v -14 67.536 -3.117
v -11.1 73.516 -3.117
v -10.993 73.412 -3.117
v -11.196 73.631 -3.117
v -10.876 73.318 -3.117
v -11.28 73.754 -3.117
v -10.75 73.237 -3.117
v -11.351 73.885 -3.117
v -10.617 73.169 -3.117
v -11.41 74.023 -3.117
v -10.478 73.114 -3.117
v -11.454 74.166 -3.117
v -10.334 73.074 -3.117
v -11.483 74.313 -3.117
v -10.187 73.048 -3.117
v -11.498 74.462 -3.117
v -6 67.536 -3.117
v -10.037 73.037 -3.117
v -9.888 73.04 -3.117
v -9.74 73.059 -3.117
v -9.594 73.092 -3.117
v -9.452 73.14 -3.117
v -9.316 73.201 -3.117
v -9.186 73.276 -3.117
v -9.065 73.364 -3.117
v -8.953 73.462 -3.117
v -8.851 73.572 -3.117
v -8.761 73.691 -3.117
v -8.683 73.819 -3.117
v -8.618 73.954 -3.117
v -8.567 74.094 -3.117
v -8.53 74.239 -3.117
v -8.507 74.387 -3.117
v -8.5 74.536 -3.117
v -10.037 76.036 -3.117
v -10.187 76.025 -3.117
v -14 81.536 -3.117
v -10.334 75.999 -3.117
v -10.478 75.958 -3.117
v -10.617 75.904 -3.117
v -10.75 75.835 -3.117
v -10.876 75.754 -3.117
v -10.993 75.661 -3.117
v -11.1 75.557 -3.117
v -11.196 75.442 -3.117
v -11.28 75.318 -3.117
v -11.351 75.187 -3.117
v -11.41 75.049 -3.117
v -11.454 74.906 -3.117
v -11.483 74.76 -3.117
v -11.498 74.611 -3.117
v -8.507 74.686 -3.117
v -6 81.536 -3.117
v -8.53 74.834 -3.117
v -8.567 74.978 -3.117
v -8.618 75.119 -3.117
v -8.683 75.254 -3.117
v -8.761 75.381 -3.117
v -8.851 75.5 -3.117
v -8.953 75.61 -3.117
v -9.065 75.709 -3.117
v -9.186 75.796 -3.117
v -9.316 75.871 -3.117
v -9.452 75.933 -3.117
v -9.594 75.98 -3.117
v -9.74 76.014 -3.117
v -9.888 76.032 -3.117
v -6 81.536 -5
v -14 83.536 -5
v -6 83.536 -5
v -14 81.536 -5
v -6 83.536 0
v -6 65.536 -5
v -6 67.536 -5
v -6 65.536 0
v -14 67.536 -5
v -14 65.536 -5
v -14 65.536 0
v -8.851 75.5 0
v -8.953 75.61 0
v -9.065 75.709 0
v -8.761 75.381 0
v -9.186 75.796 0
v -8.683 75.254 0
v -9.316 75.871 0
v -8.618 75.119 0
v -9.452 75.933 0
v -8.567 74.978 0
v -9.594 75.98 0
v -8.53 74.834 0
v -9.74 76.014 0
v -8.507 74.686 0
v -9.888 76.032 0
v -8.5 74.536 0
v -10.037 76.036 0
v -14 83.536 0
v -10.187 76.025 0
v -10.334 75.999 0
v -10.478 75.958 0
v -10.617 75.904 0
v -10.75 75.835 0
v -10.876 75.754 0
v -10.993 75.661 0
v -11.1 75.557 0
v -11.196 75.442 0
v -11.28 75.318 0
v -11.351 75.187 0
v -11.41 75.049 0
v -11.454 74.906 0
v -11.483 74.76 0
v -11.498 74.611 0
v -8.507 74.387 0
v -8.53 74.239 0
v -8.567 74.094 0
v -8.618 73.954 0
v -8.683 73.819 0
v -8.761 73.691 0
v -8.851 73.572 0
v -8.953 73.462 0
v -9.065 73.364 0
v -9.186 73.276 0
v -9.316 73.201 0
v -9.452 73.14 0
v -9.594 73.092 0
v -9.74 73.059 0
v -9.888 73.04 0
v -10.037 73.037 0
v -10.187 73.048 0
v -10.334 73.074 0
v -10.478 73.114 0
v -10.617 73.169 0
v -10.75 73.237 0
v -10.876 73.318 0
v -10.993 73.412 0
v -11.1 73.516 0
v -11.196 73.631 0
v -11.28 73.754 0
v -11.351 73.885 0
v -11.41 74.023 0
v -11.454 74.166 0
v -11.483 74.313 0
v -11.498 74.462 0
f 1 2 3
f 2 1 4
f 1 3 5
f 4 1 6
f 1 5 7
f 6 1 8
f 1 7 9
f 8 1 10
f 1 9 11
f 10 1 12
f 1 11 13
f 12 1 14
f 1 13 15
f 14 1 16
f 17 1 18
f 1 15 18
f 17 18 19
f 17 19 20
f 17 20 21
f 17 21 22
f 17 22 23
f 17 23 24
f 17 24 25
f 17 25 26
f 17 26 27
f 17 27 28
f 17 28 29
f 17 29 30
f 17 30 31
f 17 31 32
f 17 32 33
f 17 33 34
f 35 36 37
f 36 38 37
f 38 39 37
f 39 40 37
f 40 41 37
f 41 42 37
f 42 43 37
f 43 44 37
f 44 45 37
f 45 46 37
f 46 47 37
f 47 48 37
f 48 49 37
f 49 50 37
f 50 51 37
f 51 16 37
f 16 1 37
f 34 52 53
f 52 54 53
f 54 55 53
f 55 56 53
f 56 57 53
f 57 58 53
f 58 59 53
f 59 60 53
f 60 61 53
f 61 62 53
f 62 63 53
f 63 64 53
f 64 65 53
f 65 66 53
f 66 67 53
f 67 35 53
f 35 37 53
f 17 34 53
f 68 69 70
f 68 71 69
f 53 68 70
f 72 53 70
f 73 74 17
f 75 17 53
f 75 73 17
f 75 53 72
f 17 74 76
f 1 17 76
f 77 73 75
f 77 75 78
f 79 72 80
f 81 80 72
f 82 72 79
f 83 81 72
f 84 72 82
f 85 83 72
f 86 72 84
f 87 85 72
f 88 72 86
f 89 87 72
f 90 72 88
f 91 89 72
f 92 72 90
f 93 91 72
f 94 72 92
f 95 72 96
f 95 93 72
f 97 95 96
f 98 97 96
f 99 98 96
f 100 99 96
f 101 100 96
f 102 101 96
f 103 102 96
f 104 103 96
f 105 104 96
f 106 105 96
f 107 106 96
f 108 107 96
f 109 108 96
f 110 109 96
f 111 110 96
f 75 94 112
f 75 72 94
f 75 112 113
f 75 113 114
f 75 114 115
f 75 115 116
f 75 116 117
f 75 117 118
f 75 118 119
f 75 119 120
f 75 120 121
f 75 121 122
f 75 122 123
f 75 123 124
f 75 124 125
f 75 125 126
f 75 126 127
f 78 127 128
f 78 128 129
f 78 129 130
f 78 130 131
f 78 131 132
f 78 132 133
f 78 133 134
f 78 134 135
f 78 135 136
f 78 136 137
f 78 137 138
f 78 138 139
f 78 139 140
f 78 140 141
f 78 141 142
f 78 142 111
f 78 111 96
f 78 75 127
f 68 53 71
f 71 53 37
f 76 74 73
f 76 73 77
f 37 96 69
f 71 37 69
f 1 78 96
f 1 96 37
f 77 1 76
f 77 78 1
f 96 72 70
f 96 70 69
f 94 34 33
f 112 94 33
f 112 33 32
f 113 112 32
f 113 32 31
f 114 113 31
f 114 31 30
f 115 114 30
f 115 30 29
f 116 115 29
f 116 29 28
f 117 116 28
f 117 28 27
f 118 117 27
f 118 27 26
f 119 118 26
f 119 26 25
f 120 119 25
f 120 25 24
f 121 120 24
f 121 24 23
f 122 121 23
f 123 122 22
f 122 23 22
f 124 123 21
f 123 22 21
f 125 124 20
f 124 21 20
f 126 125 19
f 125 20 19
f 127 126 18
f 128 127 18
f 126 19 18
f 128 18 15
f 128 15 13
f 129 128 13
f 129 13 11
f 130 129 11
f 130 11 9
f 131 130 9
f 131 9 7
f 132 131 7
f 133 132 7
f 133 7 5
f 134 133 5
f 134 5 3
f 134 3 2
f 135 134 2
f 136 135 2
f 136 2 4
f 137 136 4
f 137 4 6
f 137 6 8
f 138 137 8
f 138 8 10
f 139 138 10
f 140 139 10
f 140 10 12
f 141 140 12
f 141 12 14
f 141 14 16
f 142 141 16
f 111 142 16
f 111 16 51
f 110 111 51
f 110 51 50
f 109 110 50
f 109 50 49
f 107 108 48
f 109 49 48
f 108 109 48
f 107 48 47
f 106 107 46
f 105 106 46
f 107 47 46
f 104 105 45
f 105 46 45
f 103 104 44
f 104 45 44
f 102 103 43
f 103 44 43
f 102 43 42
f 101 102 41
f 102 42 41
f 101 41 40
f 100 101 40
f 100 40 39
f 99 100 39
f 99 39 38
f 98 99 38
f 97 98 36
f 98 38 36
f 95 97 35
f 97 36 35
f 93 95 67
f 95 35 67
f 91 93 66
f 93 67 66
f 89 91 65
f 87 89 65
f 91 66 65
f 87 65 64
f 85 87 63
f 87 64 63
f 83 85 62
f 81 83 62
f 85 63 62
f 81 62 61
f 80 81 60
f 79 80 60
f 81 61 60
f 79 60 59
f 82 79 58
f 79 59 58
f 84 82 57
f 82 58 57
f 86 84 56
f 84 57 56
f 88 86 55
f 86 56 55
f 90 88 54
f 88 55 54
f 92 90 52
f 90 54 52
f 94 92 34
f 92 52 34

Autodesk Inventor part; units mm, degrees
ref_plane "YZ Plane" through (0, 0, 0) normal (1, 0, 0) x (0, 1, 0)
ref_plane "XZ Plane" through (0, 0, 0) normal (0, 1, 0) x (-1, 0, 0)
ref_plane "XY Plane" through (0, 0, 0) normal (0, 0, 1) x (1, 0, 0)
ref_plane "Work Plane1" through (0, 69.5363, 0) normal (0, 0, 1) x (1, 0, 0)
sketch "Sketch1" plane through (0, 69.5363, 0) normal (0, 0, 1) x (1, 0, 0)
  line L0 (9.2773, 16.5681) -> (-0.7227, 16.5681) projected
  line L1 (0, -69.5363) -> (0, -2) projected
  line L2 (-20, 0) -> (-20, -2) projected
  line L3 (0, -2) -> (-20, -2)
  line L4 (-20, -2) -> (-20, 12)
  line L5 (-20, 12) -> (0, 12)
  line L6 (0, 12) -> (0, -2)
  dimension "d17" = 14
  dimension "d18" = 20
extrude "Extrusion1" add sketch "Sketch1" along normal blind -3.1173
sketch "Sketch2" plane through (0, 69.5363, -3.1173) normal (0, 0, -1) x (1, 0, 0)
  line L0 (0, 2) -> (-20, -12)
  line L1 (-20, 2) -> (0, -12)
  circle A0 centre (-10, -5) radius 1.5
  point P0 (0, 69.5363)
  point P1 (-10, 4)
  dimension "d22" = 3
extrude "Extrusion2" cut sketch "Sketch2" against normal up to surface (3.1173 mm away)
sketch "Sketch3" plane through (0, 69.5363, -3.1173) normal (0, 0, -1) x (1, 0, 0)
  line L0 (0, -12) -> (0, 2) projected
  line L1 (-20, 2) -> (-20, -12) projected
  line L2 (-20, 2) -> (0, -12) construction
  line L3 (-20, -12) -> (0, 2) construction
  line L4 (-20, -12) -> (-20, -14.5)
  line L5 (-20, -14.5) -> (-17.5, -14.5)
  line L6 (0, 2) -> (0, 4.5)
  line L7 (0, 4.5) -> (-2.5, 4.5)
  line L8 (-20, -12) -> (0, -12) projected
  line L9 (-14, 22) -> (-6, 22)
  line L10 (-6, 22) -> (-6, -12)
  line L11 (-6, -12) -> (-14, -12)
  line L12 (-14, -12) -> (-14, 22)
  line L13 (-14, 22) -> (-6, -12) construction
  line L14 (-6, 22) -> (-14, -12) construction
  line L15 (-20, 2) -> (0, 2)
  line L16 (0, 2) -> (0, -12)
  line L17 (0, -12) -> (-20, -12)
  line L18 (-20, -12) -> (-20, 2)
  point P0 (0, 69.5363)
  point P1 (-10, 5)
  dimension "d7" = 2.5
  dimension "d8" = 2.5
  dimension "d9" = 2.5
  dimension "d10" = 2.5
  dimension "d28" = 8
extrude "Extrusion4" cut sketch "Sketch3" against normal up to surface (3.1173 mm away) contours L8 L10 L15 L0 | L8 L1 L15 L12
sketch "Sketch4" plane through (-14, 67.5363, 0) normal (0, -1, 0) x (-1, 0, 0)
  line L0 (0, 0) -> (-8, 0)
  line L1 (-8, 0) -> (-8, 5)
  line L2 (-8, 5) -> (0, 5)
  line L3 (0, 5) -> (0, 0)
  point P0 (-14, 0)
  dimension "d34" = 5
extrude "Extrusion5" add sketch "Sketch4" along normal blind 2
sketch "Sketch5" plane through (-14, 81.5363, 0) normal (0, 1, 0) x (-1, 0, 0)
  line L0 (0, 0) -> (0, -5) projected
  line L1 (-8, 0) -> (0, 0)
  line L2 (0, 0) -> (0, -5)
  line L3 (0, -5) -> (-8, -5)
  line L4 (-8, -5) -> (-8, 0)
  dimension "d35" = 5
extrude "Extrusion6" add sketch "Sketch5" along normal blind 2
properties part number "pulley_housing_top"
